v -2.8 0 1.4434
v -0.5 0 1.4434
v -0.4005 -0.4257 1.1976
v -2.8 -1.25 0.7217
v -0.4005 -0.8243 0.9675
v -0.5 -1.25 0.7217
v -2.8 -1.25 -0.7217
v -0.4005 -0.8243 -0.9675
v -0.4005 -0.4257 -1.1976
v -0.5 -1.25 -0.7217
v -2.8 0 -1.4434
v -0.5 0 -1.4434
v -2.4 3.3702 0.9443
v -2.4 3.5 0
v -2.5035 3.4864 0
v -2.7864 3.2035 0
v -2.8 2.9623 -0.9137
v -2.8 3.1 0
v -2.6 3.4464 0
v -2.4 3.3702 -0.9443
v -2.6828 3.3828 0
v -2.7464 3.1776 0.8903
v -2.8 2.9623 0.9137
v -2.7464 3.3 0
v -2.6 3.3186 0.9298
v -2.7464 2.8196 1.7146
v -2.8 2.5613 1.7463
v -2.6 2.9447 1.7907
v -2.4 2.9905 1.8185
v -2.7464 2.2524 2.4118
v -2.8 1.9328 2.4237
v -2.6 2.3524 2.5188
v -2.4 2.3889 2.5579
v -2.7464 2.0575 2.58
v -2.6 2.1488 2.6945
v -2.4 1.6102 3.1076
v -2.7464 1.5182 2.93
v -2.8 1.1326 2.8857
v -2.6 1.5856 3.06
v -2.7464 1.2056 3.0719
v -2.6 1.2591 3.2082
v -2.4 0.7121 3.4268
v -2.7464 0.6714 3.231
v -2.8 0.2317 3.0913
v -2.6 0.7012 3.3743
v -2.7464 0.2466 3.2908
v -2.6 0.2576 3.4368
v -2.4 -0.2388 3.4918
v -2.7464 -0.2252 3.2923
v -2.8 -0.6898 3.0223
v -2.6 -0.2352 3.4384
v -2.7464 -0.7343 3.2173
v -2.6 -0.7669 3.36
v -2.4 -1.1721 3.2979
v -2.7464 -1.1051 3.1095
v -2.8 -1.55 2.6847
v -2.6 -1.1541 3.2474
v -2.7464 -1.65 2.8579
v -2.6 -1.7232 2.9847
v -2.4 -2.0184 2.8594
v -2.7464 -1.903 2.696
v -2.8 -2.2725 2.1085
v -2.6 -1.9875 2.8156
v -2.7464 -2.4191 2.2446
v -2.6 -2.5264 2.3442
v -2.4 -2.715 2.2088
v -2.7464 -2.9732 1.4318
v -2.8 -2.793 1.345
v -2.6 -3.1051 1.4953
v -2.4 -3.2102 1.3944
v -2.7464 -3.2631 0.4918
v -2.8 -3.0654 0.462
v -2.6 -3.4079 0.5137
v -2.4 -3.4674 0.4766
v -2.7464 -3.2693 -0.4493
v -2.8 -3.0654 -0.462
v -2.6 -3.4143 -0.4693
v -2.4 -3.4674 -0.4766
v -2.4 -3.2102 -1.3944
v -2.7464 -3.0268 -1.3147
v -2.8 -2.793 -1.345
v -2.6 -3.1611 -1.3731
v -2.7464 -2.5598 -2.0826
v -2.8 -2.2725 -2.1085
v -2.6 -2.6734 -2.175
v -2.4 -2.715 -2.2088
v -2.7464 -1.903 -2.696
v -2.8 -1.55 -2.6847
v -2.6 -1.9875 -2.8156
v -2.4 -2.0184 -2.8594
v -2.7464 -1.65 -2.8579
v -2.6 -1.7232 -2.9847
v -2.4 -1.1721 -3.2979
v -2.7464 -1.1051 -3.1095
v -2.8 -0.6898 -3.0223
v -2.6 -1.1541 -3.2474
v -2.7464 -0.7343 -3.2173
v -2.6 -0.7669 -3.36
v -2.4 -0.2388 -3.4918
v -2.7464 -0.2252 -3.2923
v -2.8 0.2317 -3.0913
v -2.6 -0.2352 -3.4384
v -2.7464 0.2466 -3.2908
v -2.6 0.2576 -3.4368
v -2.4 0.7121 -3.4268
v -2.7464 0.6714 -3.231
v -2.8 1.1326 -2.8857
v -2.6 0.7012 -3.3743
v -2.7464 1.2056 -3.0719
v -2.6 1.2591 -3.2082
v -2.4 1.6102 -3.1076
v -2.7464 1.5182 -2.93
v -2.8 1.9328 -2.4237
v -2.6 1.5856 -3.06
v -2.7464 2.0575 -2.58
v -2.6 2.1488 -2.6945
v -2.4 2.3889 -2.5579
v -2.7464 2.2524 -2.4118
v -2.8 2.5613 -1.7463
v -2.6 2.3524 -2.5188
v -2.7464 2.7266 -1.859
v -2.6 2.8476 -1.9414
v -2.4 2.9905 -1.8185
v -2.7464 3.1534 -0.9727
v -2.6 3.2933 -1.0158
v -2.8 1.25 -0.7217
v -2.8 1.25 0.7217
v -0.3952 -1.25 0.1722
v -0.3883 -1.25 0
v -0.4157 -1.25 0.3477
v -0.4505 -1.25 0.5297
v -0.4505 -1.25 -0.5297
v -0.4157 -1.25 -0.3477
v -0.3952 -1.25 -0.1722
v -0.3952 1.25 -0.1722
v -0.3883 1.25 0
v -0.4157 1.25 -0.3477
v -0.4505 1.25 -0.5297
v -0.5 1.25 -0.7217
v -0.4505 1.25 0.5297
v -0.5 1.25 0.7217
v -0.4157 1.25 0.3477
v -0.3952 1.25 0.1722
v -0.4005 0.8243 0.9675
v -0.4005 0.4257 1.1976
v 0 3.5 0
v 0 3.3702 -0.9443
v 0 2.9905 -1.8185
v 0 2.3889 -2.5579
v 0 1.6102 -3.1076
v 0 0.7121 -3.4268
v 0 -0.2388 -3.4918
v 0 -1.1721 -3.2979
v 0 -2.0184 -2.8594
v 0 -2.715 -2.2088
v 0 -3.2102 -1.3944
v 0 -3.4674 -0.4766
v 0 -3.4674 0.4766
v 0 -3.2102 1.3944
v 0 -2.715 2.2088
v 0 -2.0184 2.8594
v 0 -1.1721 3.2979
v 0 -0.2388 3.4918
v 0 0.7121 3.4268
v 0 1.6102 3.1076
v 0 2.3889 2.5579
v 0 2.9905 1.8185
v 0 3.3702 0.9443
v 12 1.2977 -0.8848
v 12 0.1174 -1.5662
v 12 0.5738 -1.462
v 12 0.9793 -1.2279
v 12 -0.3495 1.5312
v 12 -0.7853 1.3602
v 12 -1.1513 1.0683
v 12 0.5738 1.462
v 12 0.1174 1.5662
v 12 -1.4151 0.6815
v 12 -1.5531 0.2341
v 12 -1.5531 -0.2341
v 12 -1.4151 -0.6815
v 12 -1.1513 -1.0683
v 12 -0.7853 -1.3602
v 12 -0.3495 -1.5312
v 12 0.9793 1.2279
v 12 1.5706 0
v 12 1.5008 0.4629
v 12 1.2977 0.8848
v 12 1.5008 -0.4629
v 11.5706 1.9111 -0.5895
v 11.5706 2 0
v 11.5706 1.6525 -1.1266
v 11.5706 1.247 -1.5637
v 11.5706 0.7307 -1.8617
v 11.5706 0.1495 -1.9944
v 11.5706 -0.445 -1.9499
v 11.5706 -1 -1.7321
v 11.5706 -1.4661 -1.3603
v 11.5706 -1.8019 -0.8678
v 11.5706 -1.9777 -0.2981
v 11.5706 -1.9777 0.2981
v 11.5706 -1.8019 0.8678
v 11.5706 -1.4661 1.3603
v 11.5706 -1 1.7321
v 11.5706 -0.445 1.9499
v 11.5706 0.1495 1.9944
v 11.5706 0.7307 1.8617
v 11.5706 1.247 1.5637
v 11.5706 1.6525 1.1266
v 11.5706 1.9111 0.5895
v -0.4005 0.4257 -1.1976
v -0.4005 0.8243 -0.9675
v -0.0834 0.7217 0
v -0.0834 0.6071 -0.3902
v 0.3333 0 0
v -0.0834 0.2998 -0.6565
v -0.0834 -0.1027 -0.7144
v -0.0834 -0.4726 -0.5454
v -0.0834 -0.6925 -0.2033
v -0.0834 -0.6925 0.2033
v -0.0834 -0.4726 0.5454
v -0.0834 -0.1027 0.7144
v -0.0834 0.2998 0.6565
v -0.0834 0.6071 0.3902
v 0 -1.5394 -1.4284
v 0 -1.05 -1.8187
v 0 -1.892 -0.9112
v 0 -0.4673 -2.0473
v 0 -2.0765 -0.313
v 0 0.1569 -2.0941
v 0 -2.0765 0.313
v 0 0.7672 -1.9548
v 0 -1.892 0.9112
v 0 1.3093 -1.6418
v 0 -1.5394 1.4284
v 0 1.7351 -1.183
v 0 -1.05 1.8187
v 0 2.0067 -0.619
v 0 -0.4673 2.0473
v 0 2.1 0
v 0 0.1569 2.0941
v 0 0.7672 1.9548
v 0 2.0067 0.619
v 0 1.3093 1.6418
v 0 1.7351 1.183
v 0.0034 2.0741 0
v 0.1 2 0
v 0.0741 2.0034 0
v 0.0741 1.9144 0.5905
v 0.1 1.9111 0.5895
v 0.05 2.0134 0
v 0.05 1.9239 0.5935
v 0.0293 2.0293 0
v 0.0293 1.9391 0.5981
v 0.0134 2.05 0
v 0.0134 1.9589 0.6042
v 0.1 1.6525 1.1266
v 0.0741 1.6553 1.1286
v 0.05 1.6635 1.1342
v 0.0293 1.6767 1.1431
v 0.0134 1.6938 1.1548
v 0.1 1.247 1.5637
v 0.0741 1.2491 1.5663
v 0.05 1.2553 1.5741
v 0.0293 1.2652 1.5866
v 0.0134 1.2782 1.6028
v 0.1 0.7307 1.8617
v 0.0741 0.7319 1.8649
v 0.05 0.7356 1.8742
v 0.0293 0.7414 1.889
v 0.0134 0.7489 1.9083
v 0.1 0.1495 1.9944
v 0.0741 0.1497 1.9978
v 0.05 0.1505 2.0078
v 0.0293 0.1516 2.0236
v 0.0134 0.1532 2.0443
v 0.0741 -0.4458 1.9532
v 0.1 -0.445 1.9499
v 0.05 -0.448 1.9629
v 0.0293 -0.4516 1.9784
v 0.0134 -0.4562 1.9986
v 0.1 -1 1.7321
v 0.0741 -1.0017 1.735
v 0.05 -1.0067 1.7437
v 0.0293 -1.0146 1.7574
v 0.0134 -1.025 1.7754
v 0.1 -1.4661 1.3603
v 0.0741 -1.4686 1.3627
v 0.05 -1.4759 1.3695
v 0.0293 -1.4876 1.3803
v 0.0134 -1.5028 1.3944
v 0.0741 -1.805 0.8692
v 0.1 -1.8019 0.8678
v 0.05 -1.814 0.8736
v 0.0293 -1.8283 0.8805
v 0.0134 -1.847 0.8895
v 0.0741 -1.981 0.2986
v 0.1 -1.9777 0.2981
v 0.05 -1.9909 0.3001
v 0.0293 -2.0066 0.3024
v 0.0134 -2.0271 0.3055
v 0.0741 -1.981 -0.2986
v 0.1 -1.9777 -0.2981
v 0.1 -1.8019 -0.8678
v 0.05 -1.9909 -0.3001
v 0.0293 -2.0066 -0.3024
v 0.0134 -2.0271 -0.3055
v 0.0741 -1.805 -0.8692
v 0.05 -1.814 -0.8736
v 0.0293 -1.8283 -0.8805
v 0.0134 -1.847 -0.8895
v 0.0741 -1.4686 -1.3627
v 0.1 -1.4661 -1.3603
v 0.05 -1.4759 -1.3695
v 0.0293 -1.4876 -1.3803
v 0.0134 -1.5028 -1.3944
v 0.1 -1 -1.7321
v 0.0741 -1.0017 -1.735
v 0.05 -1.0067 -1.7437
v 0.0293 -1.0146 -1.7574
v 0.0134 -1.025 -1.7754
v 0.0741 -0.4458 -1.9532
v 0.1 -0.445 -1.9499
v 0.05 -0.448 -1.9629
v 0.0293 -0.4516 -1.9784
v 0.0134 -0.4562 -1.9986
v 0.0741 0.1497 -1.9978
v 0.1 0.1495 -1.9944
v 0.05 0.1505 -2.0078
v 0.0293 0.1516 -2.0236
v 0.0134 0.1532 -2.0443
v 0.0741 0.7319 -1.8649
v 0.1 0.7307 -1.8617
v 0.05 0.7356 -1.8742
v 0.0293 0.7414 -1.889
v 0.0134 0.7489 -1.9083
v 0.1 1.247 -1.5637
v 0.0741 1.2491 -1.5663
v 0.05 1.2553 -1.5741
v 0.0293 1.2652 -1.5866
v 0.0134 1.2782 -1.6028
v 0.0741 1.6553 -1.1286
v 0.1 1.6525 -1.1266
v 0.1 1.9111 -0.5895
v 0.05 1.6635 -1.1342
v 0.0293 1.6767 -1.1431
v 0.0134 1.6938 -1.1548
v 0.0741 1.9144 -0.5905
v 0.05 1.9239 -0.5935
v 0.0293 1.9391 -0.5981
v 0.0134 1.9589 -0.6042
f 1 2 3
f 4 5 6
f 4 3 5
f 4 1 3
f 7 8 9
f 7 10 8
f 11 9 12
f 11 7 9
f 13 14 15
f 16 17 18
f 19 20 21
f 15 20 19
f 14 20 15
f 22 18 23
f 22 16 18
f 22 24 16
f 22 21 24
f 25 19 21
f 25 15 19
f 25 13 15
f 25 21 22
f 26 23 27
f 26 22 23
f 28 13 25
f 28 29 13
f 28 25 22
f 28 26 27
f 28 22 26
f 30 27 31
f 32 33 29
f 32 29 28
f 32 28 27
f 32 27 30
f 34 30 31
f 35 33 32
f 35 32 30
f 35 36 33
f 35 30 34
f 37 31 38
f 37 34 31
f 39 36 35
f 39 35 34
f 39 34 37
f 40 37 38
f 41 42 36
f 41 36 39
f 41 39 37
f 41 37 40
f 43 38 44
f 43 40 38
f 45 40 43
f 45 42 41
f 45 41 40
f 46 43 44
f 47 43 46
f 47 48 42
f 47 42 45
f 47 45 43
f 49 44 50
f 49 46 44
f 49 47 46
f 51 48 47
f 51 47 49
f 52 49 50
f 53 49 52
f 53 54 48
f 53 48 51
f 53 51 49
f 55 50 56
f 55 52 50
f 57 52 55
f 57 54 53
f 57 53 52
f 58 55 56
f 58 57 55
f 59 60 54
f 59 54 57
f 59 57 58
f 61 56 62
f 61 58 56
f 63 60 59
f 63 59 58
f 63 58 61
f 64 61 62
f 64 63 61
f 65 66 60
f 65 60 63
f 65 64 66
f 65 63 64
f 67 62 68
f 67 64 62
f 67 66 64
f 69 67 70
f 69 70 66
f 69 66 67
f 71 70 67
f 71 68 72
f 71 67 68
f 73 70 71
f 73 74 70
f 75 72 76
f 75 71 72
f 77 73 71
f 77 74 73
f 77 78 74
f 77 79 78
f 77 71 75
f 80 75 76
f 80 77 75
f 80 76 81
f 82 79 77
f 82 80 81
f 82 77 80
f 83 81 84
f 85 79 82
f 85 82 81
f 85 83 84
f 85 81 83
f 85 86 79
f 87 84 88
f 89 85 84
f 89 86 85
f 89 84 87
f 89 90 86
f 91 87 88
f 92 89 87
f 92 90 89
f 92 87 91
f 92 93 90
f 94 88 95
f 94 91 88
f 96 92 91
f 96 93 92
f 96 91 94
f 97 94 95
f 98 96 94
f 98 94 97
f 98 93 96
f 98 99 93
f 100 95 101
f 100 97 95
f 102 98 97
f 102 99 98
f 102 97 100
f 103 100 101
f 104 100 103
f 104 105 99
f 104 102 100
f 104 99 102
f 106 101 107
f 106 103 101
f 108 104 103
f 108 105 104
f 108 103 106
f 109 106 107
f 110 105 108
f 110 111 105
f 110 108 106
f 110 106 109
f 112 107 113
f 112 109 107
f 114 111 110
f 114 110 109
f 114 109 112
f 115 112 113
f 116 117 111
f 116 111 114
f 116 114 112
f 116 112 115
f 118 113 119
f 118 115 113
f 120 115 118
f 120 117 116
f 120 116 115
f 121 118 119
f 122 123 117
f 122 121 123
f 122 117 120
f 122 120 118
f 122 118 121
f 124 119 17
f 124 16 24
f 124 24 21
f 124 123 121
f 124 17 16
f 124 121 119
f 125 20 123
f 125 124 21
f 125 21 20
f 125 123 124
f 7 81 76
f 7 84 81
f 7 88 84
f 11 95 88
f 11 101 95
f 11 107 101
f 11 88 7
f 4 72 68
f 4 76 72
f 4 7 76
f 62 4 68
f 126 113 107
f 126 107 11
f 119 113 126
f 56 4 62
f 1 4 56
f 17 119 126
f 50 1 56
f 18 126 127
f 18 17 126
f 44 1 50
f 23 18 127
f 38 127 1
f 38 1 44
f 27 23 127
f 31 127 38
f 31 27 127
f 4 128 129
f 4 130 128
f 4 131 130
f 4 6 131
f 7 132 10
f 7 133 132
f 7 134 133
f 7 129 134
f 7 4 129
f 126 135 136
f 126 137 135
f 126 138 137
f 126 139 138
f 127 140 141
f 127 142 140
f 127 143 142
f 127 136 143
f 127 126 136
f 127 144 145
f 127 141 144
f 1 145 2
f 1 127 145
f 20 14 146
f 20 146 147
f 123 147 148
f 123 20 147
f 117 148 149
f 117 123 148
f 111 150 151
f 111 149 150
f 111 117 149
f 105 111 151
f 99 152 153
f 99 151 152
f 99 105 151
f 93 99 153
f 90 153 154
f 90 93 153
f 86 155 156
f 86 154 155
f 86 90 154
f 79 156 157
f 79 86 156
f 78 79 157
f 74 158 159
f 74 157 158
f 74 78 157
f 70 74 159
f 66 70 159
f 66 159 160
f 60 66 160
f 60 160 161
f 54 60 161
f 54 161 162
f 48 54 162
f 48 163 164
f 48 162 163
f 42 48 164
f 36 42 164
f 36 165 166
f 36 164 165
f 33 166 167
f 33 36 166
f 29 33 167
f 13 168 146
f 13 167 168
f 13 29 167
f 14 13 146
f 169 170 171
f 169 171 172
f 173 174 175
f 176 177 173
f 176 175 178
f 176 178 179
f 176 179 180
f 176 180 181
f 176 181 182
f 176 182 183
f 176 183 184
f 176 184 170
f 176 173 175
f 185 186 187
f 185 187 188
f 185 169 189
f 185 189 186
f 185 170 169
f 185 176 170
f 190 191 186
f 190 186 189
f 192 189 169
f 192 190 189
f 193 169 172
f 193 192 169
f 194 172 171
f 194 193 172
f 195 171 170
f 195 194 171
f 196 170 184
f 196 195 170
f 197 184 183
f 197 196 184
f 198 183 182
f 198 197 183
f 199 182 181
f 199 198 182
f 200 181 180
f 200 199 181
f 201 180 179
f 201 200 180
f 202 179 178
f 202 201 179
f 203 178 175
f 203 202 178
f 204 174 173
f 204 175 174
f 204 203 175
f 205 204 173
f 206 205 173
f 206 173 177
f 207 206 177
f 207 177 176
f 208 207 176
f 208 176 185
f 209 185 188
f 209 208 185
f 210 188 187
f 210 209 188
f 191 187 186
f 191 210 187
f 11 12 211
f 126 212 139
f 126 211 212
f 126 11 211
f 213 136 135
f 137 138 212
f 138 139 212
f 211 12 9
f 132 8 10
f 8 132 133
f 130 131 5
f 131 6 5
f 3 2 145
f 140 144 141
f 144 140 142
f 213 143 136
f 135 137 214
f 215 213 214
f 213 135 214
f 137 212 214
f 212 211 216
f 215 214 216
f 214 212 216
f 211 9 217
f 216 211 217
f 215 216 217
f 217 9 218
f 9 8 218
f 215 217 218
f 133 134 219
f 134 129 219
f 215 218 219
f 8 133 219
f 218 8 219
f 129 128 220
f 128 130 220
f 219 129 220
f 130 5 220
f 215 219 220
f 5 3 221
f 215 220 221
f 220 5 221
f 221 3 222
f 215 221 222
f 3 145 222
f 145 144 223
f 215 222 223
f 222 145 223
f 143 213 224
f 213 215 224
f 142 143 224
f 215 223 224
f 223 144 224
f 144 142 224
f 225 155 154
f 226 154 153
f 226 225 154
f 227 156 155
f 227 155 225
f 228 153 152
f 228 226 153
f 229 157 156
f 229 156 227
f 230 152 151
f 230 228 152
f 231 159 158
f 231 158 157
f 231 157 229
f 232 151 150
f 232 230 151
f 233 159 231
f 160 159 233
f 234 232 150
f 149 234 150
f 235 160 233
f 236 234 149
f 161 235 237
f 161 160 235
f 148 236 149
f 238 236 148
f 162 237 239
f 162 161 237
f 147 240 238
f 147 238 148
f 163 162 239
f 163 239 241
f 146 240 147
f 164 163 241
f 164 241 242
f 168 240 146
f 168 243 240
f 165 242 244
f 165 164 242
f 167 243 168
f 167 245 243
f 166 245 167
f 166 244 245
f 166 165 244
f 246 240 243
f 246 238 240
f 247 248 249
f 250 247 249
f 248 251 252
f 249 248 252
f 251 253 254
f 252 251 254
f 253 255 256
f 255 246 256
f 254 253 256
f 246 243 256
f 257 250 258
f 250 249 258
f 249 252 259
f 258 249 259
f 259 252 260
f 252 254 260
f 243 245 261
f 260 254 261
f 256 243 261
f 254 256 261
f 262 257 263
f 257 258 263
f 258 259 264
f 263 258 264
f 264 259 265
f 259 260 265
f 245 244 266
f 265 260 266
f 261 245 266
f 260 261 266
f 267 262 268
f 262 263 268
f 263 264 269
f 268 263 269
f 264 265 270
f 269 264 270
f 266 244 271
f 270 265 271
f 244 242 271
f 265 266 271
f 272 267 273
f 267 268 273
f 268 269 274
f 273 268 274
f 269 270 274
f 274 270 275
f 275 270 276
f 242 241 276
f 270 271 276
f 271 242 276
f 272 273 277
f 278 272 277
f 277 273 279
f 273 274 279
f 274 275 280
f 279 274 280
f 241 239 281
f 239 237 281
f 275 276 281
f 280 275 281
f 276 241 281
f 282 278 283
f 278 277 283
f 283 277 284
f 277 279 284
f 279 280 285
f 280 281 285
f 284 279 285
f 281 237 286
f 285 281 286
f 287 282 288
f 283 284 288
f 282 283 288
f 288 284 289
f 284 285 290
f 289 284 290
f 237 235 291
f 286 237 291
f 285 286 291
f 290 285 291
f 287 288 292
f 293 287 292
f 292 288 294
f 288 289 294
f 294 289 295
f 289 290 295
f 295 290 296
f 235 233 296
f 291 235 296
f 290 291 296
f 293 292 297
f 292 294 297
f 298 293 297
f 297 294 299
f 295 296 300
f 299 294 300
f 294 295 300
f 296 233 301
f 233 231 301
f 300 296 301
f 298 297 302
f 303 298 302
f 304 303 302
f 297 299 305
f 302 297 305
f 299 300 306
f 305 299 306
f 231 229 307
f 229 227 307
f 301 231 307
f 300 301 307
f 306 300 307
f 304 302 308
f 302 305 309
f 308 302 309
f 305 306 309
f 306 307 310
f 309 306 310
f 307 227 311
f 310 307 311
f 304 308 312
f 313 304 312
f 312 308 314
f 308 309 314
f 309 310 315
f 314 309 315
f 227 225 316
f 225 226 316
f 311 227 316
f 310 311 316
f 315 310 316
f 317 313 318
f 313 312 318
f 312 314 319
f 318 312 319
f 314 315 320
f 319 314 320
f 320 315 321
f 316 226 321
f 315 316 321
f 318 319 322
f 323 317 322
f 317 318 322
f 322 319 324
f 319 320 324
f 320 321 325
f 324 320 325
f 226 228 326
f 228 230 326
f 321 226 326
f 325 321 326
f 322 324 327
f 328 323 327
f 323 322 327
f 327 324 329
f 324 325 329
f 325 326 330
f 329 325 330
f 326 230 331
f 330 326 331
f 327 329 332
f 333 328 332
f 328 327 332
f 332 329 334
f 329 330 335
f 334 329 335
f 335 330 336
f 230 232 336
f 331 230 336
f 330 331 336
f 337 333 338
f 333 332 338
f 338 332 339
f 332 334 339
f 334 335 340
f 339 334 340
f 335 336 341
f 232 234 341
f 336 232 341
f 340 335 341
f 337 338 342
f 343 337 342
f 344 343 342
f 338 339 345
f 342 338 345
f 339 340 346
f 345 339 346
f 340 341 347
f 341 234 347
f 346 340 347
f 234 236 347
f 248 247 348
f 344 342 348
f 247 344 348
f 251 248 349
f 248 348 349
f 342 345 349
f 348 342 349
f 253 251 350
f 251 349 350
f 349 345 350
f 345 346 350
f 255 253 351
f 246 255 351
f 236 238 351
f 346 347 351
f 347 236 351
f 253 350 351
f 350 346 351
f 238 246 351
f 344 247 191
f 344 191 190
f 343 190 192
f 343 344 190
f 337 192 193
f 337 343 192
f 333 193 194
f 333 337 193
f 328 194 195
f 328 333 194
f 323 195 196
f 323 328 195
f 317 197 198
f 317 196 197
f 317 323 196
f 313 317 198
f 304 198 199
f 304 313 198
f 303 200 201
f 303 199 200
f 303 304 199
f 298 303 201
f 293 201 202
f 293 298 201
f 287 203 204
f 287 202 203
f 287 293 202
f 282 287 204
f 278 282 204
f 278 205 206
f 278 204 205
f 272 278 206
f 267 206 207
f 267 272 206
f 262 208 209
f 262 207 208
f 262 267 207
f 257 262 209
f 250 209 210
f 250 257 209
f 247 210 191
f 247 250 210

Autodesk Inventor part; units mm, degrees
ref_plane "YZ Plane" through (0, 0, 0) normal (1, 0, 0) x (0, 1, 0)
ref_plane "XZ Plane" through (0, 0, 0) normal (0, 1, 0) x (-1, 0, 0)
sketch "Sketch1" plane through (0, 0, 0) normal (0, 0, 1) x (1, 0, 0)
  line L0 (0.3333, 0) -> (12, 0)
  line L1 (12, 0) -> (12, 2)
  line L2 (12, 2) -> (2.1, 2)
  line L3 (2.1, 2) -> (1.6705, 2)
  line L4 (1.6705, 2) -> (0, 2)
  line L5 (0, 2) -> (0, 3.5)
  line L6 (0, 3.5) -> (-2.8, 3.5)
  line L7 (-2.8, 3.5) -> (-2.8, 1.4434)
  line L8 (-2.8, 1.4434) -> (-0.5, 1.4434)
  line L9 (-0.5, 1.4434) -> (0.3333, 0)
  line L10 (-5.76, 0) -> (14.96, 0) projected
  line L11 (0, -0.7) -> (0, 4.2) projected
  line L12 (2.1, 2) -> (0, 2) construction
  dimension "d1" = 9.9
  dimension "d2" = 0.4295
  dimension "d3" = 2.8
  dimension "d4" = 2.3
  dimension "d5" = 60
  dimension "d6" = 4
  dimension "d7" = 4
  dimension "d8" = 2.8868
  dimension "d9" = 7
  dimension "d26" = 12
revolve "Body" add sketch "Sketch1" angle 360 about axis through (0.3333, 0, 0) along (1, 0, 0) contours L9 L11 L4 L3 L2 L1 L0 | L9 L8 L7 L6 L5 L11
sketch "Sketch2" plane through (-2.8, 0, 0) normal (-1, 0, 0) x (0, 0, 1)
  circle A0 centre (0, 0) radius 1.4434 projected
  line L0 (0, -4.9) -> (0, 4.9) projected
  line L1 (-4.9, 0) -> (4.9, 0) projected
  line L2 (1.4434, 0) -> (0.7217, -1.25)
  line L3 (0.7217, -1.25) -> (-0.7217, -1.25)
  line L4 (-0.7217, -1.25) -> (-1.4434, 0)
  line L5 (-1.4434, 0) -> (-0.7217, 1.25)
  line L6 (-0.7217, 1.25) -> (0.7217, 1.25)
  line L7 (0.7217, 1.25) -> (1.4434, 0)
  point P0 (0, 0)
extrude "Slot" add sketch "Sketch2" against normal up to next contours L7 A0 | A0 L2 | L6 L0 A0 | A0 L0 L3 | L0 L6 A0 | A0 L3 L0 | L4 A0 | A0 L5
fillet "Fillet1" radius 0.4 1 edges at (-2.8, -3.5, 0)
thread "Thread" size "M4x0.7" class "6g" standard "ISO Metric profile" length 9.9
chamfer "Chamfer1" distance 0.4294 distance2 0.4294 1 edges at (12, -2, 0) measured on face at (12, -1.1003, -0.6618)
ref_plane "Work Plane1" through (29, 0, 0) normal (0, -1, 0) x (1, 0, 0)
fillet "Fillet2" radius 0.1 1 edges at (0, -2, 0)
equation "\"d1\" = GEL"
equation "\"d3\" = KOH"
equation "\"d4\" = INTI"
equation "\"d6\" = GD"
equation "\"d7\" = BDM"
equation "\"d8\" = 1.1547 * SW"
equation "\"d9\" = KOD"
equation "\"d26\" = NLG"
equation "\"d30\" = R"
equation "\"d17\" = RR"
equation "\"d13\" = GEL"
equation "\"d15\" = -0.5 * SPD + 0.5 * GD"
equation "\"d16\" = GUL"
equation "\"GD\" = NND"
equation "\"NLG\" = 12"
equation "\"GEL\" = 9.9"
equation "\"KOD\" = 7"
equation "\"KOH\" = 2.8"
equation "\"INTI\" = 2.3"
equation "\"GAL\" = 0.61345 * PTC"
equation "\"GUL\" = 0.61345 * PTC"
equation "\"BDM\" = NND"
equation "\"SW\" = 2.5"
equation "\"RR\" = 0.4"
equation "\"SPD\" = NND - 1.2269 * PTC"
equation "\"R\" = 0.1"
equation "\"TOA\" = 30deg"
equation "\"GD1\" = THREADDIA - 1.2269 * PTC"
equation "\"THREADDIA\" = 4"
equation "\"FAWI\" = 45deg"
equation "\"ANG\" = 120deg"
equation "\"PTC\" = 0.7"
equation "\"NND\" = 4"
equation "\"E0\" = 1.155 * SW"
properties part number "DIN 7984 - M4 x 12" material "Steel, Mild"
